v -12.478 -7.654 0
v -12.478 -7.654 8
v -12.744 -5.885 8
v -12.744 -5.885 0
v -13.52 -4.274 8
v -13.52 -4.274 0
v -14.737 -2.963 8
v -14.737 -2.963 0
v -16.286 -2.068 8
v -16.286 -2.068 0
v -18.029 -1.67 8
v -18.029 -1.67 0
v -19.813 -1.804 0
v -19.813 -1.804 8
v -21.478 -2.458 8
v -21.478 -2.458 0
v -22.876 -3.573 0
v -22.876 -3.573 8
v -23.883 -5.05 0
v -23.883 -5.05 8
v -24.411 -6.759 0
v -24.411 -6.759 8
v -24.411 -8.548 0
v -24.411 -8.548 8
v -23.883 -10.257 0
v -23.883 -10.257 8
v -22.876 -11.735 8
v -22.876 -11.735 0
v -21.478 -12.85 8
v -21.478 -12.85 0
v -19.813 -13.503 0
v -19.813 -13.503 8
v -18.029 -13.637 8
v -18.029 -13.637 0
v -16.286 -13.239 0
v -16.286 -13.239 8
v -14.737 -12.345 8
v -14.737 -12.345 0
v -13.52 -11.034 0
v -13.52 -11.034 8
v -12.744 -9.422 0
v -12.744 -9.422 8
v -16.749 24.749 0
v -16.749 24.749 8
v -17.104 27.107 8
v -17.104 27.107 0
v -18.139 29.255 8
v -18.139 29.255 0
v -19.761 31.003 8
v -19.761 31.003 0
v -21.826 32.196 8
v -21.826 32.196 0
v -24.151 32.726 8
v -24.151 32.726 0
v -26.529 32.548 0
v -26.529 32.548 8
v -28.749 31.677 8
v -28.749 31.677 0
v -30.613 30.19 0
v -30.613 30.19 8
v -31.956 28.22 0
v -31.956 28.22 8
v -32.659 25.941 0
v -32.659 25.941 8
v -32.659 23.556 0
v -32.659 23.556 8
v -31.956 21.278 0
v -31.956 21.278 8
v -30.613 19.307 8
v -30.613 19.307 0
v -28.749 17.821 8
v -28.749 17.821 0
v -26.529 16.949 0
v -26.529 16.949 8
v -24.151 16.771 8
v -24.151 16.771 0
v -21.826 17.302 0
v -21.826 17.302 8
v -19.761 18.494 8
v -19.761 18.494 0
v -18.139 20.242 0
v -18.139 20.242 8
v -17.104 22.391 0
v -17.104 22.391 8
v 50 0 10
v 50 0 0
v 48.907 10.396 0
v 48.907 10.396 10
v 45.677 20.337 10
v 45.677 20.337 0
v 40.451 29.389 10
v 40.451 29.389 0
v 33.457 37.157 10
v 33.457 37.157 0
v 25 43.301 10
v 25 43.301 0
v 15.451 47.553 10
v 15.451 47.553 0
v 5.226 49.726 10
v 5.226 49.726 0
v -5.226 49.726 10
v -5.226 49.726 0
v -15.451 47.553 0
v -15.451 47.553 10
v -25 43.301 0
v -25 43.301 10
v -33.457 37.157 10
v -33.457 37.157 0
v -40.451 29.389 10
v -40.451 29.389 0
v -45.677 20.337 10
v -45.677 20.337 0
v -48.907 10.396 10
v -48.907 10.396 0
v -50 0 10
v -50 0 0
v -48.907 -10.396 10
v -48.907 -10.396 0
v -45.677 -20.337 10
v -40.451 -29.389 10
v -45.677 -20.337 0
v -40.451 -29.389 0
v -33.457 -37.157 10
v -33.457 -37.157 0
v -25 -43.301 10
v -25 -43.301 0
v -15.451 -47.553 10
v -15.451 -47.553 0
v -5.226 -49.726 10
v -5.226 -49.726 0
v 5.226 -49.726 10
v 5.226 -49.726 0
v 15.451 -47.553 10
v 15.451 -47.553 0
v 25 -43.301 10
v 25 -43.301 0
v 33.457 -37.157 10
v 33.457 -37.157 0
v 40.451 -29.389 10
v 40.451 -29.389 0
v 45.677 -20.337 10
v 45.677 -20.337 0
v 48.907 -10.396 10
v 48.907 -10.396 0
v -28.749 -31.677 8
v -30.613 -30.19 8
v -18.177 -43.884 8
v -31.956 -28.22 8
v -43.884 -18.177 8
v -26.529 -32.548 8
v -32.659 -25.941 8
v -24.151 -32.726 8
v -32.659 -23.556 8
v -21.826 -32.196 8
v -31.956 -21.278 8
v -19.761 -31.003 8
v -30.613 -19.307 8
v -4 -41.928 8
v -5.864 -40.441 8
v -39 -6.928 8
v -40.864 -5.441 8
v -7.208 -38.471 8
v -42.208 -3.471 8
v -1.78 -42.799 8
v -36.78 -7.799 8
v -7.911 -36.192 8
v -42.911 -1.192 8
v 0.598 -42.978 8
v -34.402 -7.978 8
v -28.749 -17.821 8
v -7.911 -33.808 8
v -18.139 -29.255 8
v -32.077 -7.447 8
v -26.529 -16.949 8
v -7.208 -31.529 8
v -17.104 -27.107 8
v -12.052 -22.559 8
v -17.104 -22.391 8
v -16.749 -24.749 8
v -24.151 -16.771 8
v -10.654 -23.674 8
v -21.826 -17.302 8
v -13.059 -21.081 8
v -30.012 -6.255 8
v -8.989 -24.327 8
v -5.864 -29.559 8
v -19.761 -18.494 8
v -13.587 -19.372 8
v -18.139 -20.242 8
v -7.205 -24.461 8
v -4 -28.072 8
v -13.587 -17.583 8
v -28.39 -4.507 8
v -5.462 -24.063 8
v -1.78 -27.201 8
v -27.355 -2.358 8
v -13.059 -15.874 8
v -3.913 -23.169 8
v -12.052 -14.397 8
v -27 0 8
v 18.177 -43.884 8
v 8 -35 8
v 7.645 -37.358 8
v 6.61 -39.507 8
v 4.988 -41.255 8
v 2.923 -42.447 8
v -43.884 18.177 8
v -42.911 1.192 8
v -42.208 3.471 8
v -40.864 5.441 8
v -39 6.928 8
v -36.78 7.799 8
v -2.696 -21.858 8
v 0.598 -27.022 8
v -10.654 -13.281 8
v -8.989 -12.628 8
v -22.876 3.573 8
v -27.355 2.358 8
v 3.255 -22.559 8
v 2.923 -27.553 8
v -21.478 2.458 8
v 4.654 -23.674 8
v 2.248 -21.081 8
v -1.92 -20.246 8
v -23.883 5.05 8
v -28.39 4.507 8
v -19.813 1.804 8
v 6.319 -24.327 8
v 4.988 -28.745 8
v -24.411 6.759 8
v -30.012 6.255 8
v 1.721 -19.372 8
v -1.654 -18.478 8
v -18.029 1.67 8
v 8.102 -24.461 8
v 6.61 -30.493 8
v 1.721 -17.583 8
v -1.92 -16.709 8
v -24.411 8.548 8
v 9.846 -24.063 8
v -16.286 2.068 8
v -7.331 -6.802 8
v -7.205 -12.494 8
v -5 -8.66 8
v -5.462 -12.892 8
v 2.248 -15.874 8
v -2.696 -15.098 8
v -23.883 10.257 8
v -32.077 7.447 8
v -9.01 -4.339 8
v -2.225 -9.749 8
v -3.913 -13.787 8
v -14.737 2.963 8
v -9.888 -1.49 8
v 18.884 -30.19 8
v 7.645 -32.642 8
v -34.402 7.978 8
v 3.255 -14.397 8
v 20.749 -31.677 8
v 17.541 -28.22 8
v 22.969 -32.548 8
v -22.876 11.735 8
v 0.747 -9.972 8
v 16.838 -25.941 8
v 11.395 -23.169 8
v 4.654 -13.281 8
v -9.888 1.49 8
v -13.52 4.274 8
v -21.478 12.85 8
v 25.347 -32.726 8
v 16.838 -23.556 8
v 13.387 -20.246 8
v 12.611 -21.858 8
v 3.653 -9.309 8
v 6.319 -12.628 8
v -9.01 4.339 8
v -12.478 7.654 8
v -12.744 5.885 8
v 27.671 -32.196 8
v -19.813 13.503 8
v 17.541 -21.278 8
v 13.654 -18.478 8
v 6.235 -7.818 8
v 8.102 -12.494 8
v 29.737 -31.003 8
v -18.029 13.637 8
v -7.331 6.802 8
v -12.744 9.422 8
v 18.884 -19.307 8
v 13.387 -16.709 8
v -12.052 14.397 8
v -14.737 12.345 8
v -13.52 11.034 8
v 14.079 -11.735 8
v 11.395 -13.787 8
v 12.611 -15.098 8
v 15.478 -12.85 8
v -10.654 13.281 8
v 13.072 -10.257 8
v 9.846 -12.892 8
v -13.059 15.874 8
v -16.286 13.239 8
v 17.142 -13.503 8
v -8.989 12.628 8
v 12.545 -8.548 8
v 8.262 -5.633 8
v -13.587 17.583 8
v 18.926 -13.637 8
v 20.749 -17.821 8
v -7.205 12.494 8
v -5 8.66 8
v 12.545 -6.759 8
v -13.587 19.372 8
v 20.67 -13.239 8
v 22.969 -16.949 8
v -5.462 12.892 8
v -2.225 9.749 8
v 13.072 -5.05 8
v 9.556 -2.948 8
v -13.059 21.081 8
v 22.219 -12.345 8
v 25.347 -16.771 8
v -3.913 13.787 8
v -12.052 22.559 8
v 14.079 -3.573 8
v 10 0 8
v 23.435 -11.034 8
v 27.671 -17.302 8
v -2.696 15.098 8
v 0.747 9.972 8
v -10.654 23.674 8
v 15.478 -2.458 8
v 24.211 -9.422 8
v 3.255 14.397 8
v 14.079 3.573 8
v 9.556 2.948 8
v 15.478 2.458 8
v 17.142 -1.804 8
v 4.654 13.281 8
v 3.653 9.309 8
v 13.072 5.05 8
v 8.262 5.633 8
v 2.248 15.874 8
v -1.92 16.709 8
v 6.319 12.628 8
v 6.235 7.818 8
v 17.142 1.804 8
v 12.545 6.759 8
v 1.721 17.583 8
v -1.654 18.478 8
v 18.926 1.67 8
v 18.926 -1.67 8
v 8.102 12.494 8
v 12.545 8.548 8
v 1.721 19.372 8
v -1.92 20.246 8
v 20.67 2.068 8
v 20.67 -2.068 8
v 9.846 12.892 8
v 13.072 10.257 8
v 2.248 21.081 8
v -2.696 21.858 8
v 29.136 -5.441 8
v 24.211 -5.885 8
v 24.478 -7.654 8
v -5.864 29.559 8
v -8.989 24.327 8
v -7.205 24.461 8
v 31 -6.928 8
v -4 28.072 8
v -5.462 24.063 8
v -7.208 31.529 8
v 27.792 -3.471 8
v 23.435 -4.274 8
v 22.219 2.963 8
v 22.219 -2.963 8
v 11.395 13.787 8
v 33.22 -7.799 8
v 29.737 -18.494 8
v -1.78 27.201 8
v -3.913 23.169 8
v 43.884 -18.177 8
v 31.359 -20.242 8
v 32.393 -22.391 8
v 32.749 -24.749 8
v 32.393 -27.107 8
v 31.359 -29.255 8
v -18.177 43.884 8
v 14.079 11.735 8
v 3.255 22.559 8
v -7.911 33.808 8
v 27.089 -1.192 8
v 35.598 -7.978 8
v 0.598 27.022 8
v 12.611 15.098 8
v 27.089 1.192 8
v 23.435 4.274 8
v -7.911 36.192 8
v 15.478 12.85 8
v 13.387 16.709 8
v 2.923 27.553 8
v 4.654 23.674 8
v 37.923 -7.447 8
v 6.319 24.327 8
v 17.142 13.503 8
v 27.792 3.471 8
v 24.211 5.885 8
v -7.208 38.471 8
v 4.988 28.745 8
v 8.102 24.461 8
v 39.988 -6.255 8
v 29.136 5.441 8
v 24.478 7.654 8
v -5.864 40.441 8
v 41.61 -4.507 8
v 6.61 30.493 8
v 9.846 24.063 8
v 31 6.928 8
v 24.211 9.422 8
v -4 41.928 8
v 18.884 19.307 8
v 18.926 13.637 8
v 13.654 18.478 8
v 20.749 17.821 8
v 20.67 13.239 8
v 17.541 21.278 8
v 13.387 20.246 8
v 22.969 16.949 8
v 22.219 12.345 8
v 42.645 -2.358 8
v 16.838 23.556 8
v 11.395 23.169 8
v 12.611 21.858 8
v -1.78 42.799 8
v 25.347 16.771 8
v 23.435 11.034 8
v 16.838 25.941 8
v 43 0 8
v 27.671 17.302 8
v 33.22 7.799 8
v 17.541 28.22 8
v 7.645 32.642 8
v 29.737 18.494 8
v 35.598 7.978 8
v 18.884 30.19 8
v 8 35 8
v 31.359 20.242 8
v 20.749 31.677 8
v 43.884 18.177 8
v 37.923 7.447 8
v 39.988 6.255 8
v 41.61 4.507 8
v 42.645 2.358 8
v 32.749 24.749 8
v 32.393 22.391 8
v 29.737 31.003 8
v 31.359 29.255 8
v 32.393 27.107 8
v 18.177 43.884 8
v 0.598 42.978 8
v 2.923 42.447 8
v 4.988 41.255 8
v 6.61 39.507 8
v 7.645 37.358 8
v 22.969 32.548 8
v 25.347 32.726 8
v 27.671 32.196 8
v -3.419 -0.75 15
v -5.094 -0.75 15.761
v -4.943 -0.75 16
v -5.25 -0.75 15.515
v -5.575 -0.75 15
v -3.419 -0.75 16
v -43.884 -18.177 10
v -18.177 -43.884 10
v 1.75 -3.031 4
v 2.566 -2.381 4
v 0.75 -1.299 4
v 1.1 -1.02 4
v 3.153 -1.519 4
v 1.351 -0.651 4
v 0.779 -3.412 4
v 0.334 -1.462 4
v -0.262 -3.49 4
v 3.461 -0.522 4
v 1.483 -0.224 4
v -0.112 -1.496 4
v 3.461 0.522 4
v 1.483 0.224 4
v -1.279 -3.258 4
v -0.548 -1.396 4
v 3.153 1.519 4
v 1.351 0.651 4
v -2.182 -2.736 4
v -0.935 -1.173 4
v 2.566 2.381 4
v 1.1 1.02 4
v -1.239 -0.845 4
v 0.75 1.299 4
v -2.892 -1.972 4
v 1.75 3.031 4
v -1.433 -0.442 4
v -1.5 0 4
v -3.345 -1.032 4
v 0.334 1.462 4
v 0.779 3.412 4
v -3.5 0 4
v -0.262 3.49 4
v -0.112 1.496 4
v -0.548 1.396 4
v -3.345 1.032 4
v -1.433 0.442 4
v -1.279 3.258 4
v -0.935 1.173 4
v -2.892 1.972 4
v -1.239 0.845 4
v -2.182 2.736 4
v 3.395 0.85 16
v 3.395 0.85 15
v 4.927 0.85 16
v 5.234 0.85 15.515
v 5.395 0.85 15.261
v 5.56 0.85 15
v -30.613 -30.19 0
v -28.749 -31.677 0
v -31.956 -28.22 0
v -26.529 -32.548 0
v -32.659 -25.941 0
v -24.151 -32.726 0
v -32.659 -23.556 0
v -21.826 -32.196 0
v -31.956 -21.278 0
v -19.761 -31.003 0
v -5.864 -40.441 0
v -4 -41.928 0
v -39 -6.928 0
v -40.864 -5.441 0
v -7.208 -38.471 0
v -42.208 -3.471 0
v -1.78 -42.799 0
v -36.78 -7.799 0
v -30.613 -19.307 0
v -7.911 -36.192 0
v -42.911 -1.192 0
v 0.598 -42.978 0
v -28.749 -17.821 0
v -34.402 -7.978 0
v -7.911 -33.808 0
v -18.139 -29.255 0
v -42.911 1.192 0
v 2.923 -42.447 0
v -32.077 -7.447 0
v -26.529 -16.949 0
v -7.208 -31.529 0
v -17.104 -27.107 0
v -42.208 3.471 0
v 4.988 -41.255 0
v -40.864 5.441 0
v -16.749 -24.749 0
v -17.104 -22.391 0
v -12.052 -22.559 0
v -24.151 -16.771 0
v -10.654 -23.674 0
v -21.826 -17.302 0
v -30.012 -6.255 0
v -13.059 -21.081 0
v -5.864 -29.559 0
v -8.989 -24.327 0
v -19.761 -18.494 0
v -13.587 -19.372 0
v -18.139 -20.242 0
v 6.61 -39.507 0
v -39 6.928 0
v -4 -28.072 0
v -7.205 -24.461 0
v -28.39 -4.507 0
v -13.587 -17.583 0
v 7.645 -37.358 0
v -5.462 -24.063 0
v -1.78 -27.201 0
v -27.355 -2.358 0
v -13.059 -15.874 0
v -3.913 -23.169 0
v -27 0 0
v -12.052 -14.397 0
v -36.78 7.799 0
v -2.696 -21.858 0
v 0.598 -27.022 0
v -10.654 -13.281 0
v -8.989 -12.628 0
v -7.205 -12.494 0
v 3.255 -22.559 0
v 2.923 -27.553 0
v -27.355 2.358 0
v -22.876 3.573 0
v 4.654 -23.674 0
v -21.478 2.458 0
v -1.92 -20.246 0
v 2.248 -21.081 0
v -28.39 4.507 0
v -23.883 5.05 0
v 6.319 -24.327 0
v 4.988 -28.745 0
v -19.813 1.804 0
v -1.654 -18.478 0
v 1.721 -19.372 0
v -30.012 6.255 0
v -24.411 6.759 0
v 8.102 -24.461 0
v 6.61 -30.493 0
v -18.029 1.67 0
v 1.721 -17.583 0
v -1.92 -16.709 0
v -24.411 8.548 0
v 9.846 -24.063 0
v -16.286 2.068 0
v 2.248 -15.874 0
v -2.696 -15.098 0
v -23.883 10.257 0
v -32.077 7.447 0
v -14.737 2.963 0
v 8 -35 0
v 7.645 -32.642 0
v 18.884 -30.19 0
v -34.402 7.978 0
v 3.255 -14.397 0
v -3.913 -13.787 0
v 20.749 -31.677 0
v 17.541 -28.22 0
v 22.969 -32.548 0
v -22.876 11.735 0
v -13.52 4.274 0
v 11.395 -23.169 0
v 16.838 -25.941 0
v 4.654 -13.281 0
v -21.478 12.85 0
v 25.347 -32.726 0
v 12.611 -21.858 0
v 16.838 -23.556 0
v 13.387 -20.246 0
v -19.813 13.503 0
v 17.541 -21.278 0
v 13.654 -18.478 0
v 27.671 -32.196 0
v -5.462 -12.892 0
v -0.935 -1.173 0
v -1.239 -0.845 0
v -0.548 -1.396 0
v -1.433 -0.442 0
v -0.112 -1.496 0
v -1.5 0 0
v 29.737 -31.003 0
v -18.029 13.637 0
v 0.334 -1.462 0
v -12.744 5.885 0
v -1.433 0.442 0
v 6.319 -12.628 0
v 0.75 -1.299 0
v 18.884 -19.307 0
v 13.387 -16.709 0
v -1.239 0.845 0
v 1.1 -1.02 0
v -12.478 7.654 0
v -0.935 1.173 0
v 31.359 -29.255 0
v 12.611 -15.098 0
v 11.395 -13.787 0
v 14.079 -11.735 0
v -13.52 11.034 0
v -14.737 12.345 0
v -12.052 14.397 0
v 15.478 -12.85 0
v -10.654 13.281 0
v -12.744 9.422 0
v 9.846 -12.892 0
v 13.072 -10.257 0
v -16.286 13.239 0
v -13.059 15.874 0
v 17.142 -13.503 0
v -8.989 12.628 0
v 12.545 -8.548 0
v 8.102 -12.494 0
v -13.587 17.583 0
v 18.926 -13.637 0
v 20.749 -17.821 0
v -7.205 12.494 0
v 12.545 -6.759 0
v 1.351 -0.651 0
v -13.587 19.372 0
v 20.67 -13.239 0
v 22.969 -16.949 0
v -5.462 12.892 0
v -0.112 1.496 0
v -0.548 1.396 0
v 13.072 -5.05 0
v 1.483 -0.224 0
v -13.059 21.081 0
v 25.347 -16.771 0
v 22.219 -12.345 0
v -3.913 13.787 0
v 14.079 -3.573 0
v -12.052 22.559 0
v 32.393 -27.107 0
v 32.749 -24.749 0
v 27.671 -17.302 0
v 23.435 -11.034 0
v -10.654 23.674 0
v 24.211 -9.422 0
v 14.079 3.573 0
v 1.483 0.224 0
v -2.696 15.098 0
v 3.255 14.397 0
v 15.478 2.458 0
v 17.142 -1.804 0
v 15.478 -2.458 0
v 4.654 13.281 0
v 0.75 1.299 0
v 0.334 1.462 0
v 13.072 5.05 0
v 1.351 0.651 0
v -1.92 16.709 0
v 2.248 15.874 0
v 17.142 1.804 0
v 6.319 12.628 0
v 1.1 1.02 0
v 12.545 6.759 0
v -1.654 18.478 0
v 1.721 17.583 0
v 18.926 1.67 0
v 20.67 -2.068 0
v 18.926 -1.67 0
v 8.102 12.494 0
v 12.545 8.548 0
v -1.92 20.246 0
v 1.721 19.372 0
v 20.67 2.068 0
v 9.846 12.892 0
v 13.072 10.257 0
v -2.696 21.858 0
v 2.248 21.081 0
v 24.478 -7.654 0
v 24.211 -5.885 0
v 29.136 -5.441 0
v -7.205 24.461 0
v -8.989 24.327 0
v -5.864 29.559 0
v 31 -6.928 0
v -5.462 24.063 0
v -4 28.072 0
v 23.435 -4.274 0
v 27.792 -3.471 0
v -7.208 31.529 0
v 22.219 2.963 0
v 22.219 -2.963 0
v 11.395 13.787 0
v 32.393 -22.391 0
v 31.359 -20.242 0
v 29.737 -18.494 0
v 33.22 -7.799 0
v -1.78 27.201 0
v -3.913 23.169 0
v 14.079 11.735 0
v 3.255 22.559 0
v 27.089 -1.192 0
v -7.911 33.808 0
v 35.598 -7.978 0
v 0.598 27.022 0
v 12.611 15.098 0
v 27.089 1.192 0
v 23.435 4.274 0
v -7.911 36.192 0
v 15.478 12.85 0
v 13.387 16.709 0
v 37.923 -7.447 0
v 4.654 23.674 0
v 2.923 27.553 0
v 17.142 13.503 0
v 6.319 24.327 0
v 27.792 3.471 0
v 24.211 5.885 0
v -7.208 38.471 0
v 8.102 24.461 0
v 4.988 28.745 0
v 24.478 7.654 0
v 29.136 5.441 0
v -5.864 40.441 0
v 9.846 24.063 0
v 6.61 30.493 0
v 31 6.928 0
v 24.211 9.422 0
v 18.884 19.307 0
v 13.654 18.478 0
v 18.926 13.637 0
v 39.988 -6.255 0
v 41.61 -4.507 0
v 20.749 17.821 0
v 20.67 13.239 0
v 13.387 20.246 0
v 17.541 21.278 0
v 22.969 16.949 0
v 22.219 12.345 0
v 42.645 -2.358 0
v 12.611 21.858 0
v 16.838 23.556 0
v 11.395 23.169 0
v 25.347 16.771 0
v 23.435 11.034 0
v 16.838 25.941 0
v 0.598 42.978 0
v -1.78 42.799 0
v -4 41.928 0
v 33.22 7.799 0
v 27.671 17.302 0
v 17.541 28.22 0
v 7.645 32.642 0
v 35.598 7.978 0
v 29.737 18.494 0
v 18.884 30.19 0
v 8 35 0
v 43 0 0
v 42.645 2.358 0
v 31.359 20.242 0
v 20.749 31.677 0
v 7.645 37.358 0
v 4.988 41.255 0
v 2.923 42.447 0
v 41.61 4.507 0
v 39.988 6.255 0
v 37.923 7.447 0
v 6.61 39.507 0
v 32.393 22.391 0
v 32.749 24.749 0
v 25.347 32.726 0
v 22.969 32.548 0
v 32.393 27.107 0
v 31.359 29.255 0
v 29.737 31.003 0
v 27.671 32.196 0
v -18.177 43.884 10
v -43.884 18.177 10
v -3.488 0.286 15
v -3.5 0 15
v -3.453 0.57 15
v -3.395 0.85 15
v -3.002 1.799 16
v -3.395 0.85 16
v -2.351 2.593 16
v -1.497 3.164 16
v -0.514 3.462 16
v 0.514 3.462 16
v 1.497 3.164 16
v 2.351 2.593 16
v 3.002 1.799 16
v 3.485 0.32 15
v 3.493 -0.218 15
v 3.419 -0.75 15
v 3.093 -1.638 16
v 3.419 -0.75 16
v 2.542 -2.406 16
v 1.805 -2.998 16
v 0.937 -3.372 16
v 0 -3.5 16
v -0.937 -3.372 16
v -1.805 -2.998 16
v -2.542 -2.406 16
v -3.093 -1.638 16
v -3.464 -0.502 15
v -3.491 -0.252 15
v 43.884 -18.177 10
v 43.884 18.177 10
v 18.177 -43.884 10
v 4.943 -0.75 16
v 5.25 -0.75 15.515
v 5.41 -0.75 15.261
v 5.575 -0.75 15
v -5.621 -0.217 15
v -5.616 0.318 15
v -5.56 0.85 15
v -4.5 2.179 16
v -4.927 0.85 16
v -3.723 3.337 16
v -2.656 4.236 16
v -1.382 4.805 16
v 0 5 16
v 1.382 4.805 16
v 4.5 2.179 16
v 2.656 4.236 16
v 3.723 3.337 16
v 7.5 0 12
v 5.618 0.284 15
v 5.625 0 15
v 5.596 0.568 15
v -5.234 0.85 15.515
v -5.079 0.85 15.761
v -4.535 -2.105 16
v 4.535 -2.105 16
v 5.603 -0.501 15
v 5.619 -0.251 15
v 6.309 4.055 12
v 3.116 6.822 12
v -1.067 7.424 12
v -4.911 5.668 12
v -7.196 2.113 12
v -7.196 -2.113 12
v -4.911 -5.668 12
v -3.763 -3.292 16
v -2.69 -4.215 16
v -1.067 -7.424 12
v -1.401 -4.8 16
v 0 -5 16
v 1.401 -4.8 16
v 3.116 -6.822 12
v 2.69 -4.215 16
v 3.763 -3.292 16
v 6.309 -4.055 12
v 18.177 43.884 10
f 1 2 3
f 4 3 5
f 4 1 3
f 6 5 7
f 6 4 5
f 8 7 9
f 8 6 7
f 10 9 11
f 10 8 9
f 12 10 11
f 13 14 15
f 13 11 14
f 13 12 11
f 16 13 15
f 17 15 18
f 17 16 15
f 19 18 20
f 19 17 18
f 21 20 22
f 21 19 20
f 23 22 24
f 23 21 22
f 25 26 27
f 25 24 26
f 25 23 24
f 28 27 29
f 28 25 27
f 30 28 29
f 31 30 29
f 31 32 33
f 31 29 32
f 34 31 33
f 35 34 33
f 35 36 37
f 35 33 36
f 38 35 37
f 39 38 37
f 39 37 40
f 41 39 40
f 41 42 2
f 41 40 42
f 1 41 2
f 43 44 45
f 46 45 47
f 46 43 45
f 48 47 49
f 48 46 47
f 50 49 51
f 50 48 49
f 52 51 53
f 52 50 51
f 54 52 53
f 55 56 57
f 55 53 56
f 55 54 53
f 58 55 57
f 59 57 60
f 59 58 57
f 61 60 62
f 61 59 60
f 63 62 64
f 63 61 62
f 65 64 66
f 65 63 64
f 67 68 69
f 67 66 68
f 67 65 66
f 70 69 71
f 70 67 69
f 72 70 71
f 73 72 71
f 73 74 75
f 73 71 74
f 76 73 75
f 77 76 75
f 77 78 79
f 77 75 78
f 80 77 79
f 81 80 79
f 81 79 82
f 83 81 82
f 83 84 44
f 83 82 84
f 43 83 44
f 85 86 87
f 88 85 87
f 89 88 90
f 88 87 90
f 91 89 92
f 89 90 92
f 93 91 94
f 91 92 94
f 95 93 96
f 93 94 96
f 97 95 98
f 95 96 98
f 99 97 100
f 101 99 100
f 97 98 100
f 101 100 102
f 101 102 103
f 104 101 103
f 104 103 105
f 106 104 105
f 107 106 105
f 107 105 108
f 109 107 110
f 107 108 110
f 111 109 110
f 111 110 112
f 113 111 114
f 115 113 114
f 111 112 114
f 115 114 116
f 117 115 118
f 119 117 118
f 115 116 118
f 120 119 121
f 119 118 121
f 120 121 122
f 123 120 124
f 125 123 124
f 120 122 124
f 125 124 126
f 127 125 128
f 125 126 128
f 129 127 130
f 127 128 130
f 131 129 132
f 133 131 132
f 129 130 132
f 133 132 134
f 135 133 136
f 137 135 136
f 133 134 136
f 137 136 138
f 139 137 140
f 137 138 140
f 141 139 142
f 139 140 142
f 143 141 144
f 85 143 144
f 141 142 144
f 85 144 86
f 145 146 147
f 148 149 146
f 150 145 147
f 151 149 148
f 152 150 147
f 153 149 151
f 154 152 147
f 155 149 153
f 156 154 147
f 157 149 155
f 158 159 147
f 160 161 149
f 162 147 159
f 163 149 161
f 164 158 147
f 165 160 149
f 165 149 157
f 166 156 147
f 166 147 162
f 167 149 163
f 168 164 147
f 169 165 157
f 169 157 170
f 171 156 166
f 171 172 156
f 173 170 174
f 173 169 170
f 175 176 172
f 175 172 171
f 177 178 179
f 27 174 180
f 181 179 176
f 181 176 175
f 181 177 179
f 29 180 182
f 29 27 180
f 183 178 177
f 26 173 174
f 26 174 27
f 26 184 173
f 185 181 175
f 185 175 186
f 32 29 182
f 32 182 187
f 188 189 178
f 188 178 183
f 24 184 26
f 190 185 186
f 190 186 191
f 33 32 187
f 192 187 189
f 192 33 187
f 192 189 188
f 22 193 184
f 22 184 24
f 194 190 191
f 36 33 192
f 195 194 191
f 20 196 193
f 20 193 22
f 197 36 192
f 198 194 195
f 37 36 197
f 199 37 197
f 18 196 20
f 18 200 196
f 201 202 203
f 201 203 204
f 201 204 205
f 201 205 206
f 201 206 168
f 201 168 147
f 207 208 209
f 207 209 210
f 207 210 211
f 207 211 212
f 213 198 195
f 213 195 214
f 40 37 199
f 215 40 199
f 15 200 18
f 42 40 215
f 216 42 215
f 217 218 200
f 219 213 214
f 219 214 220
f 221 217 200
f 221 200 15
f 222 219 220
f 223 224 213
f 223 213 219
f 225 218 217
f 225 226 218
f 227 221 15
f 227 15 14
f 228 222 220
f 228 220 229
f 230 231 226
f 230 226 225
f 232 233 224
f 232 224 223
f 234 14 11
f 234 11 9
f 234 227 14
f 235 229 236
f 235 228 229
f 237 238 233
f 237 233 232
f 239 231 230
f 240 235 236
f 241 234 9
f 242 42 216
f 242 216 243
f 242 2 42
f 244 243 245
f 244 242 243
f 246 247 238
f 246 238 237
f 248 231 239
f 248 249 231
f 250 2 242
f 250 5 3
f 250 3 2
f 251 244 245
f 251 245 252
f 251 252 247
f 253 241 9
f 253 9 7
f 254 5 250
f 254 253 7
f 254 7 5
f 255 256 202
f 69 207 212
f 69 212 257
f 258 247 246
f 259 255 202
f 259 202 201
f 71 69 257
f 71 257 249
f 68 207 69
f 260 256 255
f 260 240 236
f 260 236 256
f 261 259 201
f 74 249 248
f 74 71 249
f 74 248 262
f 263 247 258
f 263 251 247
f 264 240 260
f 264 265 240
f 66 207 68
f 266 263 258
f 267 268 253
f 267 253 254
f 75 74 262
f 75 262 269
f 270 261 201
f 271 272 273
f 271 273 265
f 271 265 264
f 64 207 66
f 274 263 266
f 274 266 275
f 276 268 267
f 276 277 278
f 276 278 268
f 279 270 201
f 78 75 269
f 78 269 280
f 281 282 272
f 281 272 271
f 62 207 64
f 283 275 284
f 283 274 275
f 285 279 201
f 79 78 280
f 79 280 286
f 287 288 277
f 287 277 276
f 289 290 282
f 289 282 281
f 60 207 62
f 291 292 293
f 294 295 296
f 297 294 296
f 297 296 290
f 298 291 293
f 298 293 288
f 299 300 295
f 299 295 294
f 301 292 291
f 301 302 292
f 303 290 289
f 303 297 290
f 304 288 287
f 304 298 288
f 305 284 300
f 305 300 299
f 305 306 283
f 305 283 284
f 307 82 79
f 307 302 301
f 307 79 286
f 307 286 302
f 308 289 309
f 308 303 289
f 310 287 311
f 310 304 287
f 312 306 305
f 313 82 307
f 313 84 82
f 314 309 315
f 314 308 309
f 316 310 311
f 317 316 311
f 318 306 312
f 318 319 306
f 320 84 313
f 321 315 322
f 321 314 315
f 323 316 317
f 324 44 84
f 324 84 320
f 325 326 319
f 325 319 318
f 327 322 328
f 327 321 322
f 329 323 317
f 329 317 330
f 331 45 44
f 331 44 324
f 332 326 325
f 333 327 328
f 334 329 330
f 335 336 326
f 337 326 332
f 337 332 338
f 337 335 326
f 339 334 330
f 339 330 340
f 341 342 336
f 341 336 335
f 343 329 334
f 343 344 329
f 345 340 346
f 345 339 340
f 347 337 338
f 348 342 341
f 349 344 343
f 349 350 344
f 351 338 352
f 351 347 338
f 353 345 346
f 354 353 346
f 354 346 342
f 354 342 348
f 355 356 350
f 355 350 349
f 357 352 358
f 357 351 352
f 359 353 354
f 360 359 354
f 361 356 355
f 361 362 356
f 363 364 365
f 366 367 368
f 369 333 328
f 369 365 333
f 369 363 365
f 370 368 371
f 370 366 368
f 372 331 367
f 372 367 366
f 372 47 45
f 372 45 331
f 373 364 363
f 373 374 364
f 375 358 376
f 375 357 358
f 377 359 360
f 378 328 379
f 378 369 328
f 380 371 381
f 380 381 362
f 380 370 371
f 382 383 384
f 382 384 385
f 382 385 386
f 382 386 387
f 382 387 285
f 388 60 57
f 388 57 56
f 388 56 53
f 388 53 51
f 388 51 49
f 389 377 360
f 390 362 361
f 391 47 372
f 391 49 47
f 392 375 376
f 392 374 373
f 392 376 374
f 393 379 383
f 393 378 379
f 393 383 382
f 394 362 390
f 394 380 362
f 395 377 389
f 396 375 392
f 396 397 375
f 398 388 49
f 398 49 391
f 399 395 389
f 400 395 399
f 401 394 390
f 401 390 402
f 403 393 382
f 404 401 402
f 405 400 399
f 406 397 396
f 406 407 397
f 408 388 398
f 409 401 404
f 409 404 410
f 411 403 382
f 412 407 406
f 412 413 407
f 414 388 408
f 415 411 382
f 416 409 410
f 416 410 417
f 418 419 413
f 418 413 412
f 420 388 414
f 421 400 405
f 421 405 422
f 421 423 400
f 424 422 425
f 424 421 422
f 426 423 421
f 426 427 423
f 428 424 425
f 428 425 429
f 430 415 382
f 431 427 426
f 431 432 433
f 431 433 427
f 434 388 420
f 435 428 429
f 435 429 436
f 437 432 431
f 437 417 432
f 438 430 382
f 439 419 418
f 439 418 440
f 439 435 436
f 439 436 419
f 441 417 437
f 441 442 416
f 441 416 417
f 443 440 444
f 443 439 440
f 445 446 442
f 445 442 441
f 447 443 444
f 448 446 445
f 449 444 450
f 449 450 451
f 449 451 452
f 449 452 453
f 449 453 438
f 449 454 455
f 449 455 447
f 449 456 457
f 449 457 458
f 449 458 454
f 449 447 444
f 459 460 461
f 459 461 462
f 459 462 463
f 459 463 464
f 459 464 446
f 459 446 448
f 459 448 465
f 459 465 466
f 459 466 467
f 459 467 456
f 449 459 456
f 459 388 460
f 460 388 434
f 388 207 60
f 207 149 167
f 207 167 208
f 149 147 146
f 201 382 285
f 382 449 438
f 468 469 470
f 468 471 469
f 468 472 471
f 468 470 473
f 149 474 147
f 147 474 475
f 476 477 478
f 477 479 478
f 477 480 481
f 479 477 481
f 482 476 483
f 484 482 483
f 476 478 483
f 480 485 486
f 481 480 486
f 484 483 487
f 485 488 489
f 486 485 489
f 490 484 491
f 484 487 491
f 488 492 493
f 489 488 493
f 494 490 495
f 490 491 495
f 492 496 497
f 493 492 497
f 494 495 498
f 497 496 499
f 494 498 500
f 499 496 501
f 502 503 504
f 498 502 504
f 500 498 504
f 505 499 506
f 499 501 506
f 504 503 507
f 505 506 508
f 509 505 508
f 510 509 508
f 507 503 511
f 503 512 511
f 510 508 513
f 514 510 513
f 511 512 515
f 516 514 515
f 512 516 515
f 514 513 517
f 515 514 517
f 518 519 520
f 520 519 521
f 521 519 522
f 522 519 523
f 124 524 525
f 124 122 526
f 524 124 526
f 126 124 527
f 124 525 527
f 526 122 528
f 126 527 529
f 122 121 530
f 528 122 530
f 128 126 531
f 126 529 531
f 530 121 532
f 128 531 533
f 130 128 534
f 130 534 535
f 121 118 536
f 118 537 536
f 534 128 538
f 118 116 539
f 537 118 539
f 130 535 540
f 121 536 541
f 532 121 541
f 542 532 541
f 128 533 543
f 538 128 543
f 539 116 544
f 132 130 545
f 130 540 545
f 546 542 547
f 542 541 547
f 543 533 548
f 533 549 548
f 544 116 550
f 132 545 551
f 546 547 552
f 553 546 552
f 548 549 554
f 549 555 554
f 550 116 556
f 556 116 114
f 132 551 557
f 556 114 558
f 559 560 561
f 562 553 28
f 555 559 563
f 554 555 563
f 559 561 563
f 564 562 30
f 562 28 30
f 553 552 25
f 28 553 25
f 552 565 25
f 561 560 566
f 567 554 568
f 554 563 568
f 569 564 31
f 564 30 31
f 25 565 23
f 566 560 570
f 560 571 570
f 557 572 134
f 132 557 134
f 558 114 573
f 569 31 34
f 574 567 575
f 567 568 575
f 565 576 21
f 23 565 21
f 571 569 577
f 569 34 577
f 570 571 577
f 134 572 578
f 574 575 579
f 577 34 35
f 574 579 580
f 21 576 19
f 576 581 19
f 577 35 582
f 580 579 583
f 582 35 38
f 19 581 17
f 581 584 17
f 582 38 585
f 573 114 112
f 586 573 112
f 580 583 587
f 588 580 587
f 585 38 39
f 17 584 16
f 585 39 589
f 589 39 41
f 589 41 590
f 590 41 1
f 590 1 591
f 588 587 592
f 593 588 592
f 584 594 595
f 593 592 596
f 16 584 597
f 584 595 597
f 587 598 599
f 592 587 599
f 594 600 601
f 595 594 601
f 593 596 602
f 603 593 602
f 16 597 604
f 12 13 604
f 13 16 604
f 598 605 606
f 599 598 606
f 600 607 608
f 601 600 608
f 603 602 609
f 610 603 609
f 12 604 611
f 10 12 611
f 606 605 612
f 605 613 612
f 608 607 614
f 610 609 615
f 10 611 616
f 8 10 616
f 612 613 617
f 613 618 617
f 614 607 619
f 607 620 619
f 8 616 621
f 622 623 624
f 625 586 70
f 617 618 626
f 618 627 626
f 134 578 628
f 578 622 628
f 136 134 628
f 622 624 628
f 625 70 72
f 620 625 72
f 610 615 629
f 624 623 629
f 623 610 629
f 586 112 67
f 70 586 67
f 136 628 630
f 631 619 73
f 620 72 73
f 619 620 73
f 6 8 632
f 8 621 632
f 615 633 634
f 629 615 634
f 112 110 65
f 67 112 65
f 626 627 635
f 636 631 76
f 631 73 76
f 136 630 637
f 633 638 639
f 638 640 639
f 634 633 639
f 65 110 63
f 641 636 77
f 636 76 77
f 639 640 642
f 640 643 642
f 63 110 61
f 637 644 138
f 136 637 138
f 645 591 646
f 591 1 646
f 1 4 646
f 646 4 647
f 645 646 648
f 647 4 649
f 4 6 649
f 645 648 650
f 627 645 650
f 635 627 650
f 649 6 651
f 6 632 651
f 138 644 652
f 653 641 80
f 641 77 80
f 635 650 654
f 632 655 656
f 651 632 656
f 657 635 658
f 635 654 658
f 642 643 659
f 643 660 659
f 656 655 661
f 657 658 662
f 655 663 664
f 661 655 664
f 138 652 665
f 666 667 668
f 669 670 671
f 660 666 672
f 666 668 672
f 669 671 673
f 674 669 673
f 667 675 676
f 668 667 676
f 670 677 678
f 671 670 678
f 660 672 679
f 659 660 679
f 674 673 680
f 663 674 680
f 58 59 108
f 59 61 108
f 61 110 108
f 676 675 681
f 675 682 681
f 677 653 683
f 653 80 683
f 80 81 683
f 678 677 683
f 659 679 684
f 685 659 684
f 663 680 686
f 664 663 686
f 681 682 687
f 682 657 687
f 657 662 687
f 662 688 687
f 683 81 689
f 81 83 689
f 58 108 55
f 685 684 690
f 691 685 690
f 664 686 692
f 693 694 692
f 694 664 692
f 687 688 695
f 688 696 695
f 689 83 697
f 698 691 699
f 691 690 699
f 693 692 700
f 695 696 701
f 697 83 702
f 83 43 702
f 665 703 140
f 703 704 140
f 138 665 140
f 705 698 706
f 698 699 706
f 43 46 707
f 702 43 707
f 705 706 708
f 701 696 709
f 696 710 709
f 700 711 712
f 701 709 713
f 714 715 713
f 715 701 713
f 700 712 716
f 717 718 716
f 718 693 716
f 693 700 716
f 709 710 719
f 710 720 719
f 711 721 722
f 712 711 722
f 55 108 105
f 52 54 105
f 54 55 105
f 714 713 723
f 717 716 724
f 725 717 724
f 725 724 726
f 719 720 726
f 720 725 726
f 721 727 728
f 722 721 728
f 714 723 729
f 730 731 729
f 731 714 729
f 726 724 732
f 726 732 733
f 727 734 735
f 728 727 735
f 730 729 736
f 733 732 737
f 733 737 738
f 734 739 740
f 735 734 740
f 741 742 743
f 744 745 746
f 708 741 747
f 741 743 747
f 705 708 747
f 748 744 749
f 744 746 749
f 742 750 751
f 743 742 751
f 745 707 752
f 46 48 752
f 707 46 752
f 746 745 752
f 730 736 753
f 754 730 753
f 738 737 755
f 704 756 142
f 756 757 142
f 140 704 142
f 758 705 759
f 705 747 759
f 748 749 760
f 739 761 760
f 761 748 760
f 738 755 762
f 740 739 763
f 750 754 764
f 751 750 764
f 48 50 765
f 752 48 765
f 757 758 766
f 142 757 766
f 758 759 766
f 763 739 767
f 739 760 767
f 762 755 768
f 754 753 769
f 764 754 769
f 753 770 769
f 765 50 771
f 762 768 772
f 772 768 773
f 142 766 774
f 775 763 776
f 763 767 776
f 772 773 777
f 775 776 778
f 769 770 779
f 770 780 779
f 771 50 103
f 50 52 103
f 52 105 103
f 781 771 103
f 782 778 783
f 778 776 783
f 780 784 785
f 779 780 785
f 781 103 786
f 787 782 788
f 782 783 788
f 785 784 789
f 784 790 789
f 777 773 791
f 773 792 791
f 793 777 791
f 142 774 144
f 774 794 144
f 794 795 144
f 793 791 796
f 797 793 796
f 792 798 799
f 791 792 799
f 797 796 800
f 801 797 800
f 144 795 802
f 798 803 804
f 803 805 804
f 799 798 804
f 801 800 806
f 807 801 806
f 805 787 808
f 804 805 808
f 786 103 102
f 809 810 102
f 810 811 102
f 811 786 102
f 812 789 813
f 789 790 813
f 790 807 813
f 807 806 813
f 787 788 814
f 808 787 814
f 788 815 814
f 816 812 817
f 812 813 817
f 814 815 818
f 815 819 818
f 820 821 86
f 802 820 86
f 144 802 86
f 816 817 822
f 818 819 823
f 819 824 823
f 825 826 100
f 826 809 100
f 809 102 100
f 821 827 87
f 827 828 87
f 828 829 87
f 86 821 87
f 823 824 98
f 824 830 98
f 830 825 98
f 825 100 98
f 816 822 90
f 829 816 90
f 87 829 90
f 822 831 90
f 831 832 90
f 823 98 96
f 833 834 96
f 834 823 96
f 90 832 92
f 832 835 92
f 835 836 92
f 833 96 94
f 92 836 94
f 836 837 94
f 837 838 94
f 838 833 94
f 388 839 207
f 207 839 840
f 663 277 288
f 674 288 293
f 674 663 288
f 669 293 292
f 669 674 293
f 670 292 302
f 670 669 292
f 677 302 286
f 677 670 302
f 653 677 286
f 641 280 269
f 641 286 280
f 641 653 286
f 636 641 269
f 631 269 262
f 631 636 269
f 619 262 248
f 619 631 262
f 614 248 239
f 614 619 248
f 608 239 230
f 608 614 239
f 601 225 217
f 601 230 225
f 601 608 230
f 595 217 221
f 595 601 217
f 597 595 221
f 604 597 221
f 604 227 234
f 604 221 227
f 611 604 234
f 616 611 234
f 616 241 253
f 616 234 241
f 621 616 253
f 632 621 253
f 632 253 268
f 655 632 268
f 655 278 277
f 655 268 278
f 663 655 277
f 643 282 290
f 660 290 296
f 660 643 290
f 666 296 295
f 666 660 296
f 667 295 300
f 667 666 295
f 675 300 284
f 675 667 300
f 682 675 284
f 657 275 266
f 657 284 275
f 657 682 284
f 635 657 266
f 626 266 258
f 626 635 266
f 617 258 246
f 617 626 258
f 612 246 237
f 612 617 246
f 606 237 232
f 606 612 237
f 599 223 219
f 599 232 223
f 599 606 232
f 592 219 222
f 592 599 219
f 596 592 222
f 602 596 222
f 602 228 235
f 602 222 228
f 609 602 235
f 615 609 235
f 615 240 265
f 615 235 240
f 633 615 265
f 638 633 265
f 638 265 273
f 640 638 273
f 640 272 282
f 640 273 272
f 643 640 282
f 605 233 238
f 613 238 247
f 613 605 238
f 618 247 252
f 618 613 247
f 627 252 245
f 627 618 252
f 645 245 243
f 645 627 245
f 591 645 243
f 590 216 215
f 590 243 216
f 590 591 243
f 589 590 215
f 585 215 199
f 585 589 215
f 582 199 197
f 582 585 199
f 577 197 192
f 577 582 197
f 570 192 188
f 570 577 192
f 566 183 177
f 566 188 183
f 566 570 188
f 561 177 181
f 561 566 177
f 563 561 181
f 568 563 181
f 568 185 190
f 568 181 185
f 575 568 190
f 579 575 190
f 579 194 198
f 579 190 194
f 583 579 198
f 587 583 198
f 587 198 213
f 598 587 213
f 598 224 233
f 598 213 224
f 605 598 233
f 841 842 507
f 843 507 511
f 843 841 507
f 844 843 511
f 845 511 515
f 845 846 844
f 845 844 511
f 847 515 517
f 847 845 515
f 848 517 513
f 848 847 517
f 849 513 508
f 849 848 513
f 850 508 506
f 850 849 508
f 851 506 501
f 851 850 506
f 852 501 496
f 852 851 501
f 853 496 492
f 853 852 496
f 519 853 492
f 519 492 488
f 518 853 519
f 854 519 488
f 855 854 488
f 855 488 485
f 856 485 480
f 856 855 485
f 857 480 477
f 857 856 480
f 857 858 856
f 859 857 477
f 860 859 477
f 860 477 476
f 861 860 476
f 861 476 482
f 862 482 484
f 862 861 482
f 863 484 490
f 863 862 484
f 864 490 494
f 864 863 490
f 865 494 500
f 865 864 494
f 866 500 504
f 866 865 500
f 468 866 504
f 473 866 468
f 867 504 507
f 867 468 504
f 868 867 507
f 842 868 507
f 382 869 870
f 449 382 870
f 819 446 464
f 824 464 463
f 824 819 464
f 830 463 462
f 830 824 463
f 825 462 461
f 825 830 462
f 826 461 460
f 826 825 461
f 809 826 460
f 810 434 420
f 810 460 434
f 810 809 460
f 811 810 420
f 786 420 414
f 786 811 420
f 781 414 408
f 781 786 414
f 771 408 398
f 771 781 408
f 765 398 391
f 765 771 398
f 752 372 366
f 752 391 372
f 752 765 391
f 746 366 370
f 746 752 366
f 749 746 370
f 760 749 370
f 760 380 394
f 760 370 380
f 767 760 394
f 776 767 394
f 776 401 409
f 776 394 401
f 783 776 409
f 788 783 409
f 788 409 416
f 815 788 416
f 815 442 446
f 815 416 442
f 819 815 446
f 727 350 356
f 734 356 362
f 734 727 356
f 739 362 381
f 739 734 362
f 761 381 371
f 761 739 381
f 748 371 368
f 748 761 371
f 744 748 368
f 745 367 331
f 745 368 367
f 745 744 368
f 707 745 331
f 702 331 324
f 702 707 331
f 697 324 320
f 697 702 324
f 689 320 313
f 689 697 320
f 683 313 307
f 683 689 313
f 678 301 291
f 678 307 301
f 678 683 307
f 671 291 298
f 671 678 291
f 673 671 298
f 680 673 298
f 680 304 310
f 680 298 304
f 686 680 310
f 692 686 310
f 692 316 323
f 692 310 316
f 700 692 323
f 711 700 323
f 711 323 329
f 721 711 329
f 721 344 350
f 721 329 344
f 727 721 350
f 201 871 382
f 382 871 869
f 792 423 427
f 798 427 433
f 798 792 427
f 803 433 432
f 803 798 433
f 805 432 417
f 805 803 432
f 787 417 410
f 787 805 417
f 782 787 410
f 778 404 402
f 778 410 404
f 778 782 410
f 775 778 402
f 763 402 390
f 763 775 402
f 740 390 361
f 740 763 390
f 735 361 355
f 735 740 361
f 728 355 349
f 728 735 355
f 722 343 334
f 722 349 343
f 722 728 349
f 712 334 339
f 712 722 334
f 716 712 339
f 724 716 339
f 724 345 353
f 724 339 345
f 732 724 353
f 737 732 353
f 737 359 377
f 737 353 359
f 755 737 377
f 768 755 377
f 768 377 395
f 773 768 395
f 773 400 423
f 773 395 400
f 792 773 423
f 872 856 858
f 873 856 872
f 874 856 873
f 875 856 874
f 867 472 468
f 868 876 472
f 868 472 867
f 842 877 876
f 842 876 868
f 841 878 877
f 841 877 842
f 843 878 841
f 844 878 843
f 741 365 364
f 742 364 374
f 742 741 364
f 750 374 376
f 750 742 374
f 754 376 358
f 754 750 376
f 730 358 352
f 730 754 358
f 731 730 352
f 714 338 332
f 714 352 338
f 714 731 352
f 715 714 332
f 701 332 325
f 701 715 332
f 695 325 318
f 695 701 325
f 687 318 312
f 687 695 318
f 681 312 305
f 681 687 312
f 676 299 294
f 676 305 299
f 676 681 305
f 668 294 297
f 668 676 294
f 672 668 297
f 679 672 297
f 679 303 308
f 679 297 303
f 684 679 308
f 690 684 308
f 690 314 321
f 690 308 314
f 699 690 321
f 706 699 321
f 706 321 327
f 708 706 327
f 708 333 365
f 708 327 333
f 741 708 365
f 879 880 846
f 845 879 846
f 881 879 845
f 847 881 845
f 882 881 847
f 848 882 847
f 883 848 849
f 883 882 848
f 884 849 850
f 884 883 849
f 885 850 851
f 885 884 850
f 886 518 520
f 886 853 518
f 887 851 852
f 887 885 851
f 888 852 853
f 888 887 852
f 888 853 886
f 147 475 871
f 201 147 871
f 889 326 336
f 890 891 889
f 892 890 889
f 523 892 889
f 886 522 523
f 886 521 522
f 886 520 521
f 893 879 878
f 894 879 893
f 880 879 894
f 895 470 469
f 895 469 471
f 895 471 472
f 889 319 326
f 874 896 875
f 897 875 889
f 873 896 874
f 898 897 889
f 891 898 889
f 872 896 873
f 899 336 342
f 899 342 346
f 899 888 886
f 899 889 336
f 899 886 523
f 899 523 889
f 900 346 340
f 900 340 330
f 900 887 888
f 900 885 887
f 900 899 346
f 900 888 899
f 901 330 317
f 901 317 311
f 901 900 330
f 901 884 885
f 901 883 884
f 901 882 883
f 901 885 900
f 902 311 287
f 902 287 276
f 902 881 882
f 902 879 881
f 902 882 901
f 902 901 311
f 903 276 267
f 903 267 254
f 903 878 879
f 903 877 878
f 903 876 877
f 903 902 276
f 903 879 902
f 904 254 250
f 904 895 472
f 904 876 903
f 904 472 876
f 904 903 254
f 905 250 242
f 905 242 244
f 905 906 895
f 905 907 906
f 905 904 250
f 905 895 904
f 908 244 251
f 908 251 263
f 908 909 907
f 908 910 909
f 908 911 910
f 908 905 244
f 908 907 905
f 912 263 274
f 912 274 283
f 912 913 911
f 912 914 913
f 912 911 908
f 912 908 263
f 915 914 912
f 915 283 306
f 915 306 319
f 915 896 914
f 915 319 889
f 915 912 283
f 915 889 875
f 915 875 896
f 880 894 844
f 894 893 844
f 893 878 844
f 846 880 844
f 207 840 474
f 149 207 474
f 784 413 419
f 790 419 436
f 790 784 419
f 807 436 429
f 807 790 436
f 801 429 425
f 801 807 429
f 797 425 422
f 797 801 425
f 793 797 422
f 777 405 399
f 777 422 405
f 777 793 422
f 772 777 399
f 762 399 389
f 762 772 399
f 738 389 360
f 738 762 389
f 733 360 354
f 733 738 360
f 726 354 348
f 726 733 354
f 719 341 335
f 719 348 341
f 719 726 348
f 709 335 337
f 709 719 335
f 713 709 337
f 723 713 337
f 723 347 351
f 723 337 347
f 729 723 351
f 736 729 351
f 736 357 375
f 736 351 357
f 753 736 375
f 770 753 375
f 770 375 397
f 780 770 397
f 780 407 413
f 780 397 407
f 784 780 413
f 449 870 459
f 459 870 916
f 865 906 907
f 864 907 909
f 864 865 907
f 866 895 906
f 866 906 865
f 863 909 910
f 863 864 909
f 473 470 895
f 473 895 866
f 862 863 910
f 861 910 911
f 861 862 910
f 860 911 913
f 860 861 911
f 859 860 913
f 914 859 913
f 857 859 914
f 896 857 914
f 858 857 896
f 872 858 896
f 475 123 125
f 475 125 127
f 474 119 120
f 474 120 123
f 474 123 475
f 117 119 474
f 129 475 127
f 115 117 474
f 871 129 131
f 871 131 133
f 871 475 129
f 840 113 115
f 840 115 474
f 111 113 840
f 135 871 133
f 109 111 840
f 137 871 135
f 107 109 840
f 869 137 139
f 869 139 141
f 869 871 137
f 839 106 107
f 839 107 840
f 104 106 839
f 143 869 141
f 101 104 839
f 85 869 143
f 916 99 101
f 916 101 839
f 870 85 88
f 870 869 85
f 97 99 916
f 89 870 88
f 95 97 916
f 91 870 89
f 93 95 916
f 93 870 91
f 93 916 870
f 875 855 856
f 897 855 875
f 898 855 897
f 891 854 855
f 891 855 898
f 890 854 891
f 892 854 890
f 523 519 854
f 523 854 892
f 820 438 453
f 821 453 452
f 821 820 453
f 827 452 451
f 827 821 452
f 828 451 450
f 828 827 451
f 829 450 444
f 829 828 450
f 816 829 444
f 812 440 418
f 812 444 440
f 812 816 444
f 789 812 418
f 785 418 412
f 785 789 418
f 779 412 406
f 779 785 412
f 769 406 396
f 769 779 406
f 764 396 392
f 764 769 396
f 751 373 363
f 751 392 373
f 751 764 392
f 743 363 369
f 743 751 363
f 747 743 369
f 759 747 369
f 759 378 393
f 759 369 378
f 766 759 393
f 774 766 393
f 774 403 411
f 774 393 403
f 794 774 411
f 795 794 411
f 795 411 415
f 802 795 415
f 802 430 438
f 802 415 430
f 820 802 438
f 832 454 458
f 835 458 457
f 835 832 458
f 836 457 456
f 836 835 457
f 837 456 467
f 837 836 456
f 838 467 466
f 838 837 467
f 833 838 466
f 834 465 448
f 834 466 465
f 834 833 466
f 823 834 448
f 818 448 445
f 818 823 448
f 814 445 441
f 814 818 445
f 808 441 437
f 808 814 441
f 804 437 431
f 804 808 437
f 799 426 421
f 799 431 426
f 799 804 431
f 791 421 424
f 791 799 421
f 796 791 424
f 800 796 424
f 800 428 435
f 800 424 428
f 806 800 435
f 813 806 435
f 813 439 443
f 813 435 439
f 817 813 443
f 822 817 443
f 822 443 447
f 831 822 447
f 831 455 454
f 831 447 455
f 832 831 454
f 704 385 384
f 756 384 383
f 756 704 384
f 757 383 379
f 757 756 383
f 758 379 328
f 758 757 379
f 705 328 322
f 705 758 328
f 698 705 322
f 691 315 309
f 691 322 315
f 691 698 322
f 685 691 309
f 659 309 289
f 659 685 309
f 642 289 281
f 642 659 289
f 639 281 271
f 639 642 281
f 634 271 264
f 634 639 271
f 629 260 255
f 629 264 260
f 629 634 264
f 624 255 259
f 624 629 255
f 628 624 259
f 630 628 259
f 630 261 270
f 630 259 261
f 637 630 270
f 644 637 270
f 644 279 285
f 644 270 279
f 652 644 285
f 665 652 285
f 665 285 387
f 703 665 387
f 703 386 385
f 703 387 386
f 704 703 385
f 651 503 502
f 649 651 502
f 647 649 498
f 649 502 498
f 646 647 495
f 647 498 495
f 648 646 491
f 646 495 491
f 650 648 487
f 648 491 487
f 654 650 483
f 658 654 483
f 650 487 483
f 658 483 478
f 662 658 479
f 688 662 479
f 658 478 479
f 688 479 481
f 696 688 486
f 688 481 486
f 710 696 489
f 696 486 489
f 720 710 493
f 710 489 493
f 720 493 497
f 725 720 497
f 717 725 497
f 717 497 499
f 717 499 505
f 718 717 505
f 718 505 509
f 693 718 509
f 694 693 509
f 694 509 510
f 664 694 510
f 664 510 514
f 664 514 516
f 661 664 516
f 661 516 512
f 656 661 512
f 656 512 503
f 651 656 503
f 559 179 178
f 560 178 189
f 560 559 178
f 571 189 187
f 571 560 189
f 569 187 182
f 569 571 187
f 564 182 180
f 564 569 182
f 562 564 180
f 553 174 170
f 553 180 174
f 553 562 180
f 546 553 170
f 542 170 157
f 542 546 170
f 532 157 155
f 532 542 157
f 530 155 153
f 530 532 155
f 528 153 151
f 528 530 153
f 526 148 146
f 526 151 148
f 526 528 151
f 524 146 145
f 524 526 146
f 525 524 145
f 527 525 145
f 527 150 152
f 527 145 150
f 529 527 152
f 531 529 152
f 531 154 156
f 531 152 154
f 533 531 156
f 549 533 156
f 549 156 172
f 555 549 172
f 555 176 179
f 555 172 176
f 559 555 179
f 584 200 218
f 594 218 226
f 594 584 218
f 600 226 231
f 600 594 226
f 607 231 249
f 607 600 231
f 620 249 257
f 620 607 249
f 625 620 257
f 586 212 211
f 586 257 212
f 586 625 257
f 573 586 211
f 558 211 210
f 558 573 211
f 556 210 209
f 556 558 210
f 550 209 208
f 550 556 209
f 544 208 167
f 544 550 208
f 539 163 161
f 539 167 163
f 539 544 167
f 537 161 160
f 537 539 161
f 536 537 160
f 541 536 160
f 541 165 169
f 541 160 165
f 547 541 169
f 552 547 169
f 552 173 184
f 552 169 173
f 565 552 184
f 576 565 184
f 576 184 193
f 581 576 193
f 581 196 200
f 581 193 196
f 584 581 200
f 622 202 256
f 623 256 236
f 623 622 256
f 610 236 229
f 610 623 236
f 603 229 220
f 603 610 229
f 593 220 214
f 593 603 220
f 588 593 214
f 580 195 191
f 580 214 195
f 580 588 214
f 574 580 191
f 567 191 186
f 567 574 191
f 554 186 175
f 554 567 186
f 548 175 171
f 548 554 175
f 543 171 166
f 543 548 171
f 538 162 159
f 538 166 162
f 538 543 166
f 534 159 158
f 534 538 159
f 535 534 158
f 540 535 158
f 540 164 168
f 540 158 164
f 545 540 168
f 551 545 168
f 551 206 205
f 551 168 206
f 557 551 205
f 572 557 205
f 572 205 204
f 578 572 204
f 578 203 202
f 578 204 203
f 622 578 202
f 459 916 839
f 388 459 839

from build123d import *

# Parameters (mm, degrees)
SKETCH_R        = 50
SKETCH_R_2      = 8
SKETCH_R_3      = 6
PAD_DEPTH       = 10
POCKET_DEPTH    = 2
CYLINDER_R      = 3.5
CYLINDER_DEPTH  = 12
SKETCH002_R     = 1.5
POCKET001_DEPTH = 10
BOX_W           = 15
BOX_H           = 1.6
BOX_DEPTH       = 4


with BuildPart() as part:
    # Sketch → Pad (new body)
    with BuildSketch(Plane.XY):
        Circle(SKETCH_R)
        with Locations((0, 35)):
            Circle(SKETCH_R_2, mode=Mode.SUBTRACT)
        with Locations((24.748737, 24.748737)):
            Circle(SKETCH_R_2, mode=Mode.SUBTRACT)
        with Locations((35, 0)):
            Circle(SKETCH_R_2, mode=Mode.SUBTRACT)
        with Locations((24.748737, -24.748737)):
            Circle(SKETCH_R_2, mode=Mode.SUBTRACT)
        with Locations((0, -35)):
            Circle(SKETCH_R_2, mode=Mode.SUBTRACT)
        with Locations((-24.748737, -24.748737)):
            Circle(SKETCH_R_2, mode=Mode.SUBTRACT)
        with Locations((-35, 0)):
            Circle(SKETCH_R_2, mode=Mode.SUBTRACT)
        with Locations((-24.748737, 24.748737)):
            Circle(SKETCH_R_2, mode=Mode.SUBTRACT)
        with Locations((-7.653669, -18.477591)):
            Circle(SKETCH_R_3, mode=Mode.SUBTRACT)
        with Locations((7.653669, -18.477591)):
            Circle(SKETCH_R_3, mode=Mode.SUBTRACT)
        with Locations((18.477591, -7.653669)):
            Circle(SKETCH_R_3, mode=Mode.SUBTRACT)
        with Locations((18.477591, 7.653669)):
            Circle(SKETCH_R_3, mode=Mode.SUBTRACT)
        with Locations((7.653669, 18.477591)):
            Circle(SKETCH_R_3, mode=Mode.SUBTRACT)
        with Locations((-7.653669, 18.477591)):
            Circle(SKETCH_R_3, mode=Mode.SUBTRACT)
        with Locations((-18.477591, 7.653669)):
            Circle(SKETCH_R_3, mode=Mode.SUBTRACT)
        with Locations((-18.477591, -7.653669)):
            Circle(SKETCH_R_3, mode=Mode.SUBTRACT)
    extrude(amount=PAD_DEPTH)

    # Sketch001 (on Face19 of Pad) → Pocket (cut)
    with BuildSketch(Plane.XY.offset(10)):
        Polygon((43.884278, 18.177463), (18.177463, 43.884278), (-18.177463, 43.884278), (-43.884278, 18.177463), (-43.884278, -18.177463), (-18.177463, -43.884278), (18.177463, -43.884278), (43.884278, -18.177463), align=None)
    extrude(amount=-POCKET_DEPTH, mode=Mode.SUBTRACT)

    # Cone → Cone (revolve)
    with BuildSketch(Plane(origin=(0, 0, 8), x_dir=(1, 0, 0), z_dir=(0, -1, 0))):
        Polygon((0, 0), (10, 0), (5, 8), (0, 8), align=None)
    revolve(axis=Axis((0, 0, 8), (0, 0, 1)))

    # Cylinder → Cylinder (cut)
    with BuildSketch(Plane(origin=(0, 0, 16), x_dir=(-1, 0, 0), z_dir=(0, 0, -1))):
        Circle(CYLINDER_R)
    extrude(amount=CYLINDER_DEPTH, mode=Mode.SUBTRACT)

    # Sketch002 (on Face32 of Cylinder) → Pocket001 (cut)
    with BuildSketch(Plane(origin=(0, 0, 4), x_dir=(-1, 0, 0), z_dir=(0, 0, 1))):
        Circle(SKETCH002_R)
    extrude(amount=-POCKET001_DEPTH, mode=Mode.SUBTRACT)

    # Box → Box (cut)
    with BuildSketch(Plane(origin=(-7, -0.75, 15), x_dir=(1, 0, 0), z_dir=(0, 0, 1))):
        with Locations((7.5, 0.8)):
            Rectangle(BOX_W, BOX_H)
    extrude(amount=BOX_DEPTH, mode=Mode.SUBTRACT)


solid = part.part
